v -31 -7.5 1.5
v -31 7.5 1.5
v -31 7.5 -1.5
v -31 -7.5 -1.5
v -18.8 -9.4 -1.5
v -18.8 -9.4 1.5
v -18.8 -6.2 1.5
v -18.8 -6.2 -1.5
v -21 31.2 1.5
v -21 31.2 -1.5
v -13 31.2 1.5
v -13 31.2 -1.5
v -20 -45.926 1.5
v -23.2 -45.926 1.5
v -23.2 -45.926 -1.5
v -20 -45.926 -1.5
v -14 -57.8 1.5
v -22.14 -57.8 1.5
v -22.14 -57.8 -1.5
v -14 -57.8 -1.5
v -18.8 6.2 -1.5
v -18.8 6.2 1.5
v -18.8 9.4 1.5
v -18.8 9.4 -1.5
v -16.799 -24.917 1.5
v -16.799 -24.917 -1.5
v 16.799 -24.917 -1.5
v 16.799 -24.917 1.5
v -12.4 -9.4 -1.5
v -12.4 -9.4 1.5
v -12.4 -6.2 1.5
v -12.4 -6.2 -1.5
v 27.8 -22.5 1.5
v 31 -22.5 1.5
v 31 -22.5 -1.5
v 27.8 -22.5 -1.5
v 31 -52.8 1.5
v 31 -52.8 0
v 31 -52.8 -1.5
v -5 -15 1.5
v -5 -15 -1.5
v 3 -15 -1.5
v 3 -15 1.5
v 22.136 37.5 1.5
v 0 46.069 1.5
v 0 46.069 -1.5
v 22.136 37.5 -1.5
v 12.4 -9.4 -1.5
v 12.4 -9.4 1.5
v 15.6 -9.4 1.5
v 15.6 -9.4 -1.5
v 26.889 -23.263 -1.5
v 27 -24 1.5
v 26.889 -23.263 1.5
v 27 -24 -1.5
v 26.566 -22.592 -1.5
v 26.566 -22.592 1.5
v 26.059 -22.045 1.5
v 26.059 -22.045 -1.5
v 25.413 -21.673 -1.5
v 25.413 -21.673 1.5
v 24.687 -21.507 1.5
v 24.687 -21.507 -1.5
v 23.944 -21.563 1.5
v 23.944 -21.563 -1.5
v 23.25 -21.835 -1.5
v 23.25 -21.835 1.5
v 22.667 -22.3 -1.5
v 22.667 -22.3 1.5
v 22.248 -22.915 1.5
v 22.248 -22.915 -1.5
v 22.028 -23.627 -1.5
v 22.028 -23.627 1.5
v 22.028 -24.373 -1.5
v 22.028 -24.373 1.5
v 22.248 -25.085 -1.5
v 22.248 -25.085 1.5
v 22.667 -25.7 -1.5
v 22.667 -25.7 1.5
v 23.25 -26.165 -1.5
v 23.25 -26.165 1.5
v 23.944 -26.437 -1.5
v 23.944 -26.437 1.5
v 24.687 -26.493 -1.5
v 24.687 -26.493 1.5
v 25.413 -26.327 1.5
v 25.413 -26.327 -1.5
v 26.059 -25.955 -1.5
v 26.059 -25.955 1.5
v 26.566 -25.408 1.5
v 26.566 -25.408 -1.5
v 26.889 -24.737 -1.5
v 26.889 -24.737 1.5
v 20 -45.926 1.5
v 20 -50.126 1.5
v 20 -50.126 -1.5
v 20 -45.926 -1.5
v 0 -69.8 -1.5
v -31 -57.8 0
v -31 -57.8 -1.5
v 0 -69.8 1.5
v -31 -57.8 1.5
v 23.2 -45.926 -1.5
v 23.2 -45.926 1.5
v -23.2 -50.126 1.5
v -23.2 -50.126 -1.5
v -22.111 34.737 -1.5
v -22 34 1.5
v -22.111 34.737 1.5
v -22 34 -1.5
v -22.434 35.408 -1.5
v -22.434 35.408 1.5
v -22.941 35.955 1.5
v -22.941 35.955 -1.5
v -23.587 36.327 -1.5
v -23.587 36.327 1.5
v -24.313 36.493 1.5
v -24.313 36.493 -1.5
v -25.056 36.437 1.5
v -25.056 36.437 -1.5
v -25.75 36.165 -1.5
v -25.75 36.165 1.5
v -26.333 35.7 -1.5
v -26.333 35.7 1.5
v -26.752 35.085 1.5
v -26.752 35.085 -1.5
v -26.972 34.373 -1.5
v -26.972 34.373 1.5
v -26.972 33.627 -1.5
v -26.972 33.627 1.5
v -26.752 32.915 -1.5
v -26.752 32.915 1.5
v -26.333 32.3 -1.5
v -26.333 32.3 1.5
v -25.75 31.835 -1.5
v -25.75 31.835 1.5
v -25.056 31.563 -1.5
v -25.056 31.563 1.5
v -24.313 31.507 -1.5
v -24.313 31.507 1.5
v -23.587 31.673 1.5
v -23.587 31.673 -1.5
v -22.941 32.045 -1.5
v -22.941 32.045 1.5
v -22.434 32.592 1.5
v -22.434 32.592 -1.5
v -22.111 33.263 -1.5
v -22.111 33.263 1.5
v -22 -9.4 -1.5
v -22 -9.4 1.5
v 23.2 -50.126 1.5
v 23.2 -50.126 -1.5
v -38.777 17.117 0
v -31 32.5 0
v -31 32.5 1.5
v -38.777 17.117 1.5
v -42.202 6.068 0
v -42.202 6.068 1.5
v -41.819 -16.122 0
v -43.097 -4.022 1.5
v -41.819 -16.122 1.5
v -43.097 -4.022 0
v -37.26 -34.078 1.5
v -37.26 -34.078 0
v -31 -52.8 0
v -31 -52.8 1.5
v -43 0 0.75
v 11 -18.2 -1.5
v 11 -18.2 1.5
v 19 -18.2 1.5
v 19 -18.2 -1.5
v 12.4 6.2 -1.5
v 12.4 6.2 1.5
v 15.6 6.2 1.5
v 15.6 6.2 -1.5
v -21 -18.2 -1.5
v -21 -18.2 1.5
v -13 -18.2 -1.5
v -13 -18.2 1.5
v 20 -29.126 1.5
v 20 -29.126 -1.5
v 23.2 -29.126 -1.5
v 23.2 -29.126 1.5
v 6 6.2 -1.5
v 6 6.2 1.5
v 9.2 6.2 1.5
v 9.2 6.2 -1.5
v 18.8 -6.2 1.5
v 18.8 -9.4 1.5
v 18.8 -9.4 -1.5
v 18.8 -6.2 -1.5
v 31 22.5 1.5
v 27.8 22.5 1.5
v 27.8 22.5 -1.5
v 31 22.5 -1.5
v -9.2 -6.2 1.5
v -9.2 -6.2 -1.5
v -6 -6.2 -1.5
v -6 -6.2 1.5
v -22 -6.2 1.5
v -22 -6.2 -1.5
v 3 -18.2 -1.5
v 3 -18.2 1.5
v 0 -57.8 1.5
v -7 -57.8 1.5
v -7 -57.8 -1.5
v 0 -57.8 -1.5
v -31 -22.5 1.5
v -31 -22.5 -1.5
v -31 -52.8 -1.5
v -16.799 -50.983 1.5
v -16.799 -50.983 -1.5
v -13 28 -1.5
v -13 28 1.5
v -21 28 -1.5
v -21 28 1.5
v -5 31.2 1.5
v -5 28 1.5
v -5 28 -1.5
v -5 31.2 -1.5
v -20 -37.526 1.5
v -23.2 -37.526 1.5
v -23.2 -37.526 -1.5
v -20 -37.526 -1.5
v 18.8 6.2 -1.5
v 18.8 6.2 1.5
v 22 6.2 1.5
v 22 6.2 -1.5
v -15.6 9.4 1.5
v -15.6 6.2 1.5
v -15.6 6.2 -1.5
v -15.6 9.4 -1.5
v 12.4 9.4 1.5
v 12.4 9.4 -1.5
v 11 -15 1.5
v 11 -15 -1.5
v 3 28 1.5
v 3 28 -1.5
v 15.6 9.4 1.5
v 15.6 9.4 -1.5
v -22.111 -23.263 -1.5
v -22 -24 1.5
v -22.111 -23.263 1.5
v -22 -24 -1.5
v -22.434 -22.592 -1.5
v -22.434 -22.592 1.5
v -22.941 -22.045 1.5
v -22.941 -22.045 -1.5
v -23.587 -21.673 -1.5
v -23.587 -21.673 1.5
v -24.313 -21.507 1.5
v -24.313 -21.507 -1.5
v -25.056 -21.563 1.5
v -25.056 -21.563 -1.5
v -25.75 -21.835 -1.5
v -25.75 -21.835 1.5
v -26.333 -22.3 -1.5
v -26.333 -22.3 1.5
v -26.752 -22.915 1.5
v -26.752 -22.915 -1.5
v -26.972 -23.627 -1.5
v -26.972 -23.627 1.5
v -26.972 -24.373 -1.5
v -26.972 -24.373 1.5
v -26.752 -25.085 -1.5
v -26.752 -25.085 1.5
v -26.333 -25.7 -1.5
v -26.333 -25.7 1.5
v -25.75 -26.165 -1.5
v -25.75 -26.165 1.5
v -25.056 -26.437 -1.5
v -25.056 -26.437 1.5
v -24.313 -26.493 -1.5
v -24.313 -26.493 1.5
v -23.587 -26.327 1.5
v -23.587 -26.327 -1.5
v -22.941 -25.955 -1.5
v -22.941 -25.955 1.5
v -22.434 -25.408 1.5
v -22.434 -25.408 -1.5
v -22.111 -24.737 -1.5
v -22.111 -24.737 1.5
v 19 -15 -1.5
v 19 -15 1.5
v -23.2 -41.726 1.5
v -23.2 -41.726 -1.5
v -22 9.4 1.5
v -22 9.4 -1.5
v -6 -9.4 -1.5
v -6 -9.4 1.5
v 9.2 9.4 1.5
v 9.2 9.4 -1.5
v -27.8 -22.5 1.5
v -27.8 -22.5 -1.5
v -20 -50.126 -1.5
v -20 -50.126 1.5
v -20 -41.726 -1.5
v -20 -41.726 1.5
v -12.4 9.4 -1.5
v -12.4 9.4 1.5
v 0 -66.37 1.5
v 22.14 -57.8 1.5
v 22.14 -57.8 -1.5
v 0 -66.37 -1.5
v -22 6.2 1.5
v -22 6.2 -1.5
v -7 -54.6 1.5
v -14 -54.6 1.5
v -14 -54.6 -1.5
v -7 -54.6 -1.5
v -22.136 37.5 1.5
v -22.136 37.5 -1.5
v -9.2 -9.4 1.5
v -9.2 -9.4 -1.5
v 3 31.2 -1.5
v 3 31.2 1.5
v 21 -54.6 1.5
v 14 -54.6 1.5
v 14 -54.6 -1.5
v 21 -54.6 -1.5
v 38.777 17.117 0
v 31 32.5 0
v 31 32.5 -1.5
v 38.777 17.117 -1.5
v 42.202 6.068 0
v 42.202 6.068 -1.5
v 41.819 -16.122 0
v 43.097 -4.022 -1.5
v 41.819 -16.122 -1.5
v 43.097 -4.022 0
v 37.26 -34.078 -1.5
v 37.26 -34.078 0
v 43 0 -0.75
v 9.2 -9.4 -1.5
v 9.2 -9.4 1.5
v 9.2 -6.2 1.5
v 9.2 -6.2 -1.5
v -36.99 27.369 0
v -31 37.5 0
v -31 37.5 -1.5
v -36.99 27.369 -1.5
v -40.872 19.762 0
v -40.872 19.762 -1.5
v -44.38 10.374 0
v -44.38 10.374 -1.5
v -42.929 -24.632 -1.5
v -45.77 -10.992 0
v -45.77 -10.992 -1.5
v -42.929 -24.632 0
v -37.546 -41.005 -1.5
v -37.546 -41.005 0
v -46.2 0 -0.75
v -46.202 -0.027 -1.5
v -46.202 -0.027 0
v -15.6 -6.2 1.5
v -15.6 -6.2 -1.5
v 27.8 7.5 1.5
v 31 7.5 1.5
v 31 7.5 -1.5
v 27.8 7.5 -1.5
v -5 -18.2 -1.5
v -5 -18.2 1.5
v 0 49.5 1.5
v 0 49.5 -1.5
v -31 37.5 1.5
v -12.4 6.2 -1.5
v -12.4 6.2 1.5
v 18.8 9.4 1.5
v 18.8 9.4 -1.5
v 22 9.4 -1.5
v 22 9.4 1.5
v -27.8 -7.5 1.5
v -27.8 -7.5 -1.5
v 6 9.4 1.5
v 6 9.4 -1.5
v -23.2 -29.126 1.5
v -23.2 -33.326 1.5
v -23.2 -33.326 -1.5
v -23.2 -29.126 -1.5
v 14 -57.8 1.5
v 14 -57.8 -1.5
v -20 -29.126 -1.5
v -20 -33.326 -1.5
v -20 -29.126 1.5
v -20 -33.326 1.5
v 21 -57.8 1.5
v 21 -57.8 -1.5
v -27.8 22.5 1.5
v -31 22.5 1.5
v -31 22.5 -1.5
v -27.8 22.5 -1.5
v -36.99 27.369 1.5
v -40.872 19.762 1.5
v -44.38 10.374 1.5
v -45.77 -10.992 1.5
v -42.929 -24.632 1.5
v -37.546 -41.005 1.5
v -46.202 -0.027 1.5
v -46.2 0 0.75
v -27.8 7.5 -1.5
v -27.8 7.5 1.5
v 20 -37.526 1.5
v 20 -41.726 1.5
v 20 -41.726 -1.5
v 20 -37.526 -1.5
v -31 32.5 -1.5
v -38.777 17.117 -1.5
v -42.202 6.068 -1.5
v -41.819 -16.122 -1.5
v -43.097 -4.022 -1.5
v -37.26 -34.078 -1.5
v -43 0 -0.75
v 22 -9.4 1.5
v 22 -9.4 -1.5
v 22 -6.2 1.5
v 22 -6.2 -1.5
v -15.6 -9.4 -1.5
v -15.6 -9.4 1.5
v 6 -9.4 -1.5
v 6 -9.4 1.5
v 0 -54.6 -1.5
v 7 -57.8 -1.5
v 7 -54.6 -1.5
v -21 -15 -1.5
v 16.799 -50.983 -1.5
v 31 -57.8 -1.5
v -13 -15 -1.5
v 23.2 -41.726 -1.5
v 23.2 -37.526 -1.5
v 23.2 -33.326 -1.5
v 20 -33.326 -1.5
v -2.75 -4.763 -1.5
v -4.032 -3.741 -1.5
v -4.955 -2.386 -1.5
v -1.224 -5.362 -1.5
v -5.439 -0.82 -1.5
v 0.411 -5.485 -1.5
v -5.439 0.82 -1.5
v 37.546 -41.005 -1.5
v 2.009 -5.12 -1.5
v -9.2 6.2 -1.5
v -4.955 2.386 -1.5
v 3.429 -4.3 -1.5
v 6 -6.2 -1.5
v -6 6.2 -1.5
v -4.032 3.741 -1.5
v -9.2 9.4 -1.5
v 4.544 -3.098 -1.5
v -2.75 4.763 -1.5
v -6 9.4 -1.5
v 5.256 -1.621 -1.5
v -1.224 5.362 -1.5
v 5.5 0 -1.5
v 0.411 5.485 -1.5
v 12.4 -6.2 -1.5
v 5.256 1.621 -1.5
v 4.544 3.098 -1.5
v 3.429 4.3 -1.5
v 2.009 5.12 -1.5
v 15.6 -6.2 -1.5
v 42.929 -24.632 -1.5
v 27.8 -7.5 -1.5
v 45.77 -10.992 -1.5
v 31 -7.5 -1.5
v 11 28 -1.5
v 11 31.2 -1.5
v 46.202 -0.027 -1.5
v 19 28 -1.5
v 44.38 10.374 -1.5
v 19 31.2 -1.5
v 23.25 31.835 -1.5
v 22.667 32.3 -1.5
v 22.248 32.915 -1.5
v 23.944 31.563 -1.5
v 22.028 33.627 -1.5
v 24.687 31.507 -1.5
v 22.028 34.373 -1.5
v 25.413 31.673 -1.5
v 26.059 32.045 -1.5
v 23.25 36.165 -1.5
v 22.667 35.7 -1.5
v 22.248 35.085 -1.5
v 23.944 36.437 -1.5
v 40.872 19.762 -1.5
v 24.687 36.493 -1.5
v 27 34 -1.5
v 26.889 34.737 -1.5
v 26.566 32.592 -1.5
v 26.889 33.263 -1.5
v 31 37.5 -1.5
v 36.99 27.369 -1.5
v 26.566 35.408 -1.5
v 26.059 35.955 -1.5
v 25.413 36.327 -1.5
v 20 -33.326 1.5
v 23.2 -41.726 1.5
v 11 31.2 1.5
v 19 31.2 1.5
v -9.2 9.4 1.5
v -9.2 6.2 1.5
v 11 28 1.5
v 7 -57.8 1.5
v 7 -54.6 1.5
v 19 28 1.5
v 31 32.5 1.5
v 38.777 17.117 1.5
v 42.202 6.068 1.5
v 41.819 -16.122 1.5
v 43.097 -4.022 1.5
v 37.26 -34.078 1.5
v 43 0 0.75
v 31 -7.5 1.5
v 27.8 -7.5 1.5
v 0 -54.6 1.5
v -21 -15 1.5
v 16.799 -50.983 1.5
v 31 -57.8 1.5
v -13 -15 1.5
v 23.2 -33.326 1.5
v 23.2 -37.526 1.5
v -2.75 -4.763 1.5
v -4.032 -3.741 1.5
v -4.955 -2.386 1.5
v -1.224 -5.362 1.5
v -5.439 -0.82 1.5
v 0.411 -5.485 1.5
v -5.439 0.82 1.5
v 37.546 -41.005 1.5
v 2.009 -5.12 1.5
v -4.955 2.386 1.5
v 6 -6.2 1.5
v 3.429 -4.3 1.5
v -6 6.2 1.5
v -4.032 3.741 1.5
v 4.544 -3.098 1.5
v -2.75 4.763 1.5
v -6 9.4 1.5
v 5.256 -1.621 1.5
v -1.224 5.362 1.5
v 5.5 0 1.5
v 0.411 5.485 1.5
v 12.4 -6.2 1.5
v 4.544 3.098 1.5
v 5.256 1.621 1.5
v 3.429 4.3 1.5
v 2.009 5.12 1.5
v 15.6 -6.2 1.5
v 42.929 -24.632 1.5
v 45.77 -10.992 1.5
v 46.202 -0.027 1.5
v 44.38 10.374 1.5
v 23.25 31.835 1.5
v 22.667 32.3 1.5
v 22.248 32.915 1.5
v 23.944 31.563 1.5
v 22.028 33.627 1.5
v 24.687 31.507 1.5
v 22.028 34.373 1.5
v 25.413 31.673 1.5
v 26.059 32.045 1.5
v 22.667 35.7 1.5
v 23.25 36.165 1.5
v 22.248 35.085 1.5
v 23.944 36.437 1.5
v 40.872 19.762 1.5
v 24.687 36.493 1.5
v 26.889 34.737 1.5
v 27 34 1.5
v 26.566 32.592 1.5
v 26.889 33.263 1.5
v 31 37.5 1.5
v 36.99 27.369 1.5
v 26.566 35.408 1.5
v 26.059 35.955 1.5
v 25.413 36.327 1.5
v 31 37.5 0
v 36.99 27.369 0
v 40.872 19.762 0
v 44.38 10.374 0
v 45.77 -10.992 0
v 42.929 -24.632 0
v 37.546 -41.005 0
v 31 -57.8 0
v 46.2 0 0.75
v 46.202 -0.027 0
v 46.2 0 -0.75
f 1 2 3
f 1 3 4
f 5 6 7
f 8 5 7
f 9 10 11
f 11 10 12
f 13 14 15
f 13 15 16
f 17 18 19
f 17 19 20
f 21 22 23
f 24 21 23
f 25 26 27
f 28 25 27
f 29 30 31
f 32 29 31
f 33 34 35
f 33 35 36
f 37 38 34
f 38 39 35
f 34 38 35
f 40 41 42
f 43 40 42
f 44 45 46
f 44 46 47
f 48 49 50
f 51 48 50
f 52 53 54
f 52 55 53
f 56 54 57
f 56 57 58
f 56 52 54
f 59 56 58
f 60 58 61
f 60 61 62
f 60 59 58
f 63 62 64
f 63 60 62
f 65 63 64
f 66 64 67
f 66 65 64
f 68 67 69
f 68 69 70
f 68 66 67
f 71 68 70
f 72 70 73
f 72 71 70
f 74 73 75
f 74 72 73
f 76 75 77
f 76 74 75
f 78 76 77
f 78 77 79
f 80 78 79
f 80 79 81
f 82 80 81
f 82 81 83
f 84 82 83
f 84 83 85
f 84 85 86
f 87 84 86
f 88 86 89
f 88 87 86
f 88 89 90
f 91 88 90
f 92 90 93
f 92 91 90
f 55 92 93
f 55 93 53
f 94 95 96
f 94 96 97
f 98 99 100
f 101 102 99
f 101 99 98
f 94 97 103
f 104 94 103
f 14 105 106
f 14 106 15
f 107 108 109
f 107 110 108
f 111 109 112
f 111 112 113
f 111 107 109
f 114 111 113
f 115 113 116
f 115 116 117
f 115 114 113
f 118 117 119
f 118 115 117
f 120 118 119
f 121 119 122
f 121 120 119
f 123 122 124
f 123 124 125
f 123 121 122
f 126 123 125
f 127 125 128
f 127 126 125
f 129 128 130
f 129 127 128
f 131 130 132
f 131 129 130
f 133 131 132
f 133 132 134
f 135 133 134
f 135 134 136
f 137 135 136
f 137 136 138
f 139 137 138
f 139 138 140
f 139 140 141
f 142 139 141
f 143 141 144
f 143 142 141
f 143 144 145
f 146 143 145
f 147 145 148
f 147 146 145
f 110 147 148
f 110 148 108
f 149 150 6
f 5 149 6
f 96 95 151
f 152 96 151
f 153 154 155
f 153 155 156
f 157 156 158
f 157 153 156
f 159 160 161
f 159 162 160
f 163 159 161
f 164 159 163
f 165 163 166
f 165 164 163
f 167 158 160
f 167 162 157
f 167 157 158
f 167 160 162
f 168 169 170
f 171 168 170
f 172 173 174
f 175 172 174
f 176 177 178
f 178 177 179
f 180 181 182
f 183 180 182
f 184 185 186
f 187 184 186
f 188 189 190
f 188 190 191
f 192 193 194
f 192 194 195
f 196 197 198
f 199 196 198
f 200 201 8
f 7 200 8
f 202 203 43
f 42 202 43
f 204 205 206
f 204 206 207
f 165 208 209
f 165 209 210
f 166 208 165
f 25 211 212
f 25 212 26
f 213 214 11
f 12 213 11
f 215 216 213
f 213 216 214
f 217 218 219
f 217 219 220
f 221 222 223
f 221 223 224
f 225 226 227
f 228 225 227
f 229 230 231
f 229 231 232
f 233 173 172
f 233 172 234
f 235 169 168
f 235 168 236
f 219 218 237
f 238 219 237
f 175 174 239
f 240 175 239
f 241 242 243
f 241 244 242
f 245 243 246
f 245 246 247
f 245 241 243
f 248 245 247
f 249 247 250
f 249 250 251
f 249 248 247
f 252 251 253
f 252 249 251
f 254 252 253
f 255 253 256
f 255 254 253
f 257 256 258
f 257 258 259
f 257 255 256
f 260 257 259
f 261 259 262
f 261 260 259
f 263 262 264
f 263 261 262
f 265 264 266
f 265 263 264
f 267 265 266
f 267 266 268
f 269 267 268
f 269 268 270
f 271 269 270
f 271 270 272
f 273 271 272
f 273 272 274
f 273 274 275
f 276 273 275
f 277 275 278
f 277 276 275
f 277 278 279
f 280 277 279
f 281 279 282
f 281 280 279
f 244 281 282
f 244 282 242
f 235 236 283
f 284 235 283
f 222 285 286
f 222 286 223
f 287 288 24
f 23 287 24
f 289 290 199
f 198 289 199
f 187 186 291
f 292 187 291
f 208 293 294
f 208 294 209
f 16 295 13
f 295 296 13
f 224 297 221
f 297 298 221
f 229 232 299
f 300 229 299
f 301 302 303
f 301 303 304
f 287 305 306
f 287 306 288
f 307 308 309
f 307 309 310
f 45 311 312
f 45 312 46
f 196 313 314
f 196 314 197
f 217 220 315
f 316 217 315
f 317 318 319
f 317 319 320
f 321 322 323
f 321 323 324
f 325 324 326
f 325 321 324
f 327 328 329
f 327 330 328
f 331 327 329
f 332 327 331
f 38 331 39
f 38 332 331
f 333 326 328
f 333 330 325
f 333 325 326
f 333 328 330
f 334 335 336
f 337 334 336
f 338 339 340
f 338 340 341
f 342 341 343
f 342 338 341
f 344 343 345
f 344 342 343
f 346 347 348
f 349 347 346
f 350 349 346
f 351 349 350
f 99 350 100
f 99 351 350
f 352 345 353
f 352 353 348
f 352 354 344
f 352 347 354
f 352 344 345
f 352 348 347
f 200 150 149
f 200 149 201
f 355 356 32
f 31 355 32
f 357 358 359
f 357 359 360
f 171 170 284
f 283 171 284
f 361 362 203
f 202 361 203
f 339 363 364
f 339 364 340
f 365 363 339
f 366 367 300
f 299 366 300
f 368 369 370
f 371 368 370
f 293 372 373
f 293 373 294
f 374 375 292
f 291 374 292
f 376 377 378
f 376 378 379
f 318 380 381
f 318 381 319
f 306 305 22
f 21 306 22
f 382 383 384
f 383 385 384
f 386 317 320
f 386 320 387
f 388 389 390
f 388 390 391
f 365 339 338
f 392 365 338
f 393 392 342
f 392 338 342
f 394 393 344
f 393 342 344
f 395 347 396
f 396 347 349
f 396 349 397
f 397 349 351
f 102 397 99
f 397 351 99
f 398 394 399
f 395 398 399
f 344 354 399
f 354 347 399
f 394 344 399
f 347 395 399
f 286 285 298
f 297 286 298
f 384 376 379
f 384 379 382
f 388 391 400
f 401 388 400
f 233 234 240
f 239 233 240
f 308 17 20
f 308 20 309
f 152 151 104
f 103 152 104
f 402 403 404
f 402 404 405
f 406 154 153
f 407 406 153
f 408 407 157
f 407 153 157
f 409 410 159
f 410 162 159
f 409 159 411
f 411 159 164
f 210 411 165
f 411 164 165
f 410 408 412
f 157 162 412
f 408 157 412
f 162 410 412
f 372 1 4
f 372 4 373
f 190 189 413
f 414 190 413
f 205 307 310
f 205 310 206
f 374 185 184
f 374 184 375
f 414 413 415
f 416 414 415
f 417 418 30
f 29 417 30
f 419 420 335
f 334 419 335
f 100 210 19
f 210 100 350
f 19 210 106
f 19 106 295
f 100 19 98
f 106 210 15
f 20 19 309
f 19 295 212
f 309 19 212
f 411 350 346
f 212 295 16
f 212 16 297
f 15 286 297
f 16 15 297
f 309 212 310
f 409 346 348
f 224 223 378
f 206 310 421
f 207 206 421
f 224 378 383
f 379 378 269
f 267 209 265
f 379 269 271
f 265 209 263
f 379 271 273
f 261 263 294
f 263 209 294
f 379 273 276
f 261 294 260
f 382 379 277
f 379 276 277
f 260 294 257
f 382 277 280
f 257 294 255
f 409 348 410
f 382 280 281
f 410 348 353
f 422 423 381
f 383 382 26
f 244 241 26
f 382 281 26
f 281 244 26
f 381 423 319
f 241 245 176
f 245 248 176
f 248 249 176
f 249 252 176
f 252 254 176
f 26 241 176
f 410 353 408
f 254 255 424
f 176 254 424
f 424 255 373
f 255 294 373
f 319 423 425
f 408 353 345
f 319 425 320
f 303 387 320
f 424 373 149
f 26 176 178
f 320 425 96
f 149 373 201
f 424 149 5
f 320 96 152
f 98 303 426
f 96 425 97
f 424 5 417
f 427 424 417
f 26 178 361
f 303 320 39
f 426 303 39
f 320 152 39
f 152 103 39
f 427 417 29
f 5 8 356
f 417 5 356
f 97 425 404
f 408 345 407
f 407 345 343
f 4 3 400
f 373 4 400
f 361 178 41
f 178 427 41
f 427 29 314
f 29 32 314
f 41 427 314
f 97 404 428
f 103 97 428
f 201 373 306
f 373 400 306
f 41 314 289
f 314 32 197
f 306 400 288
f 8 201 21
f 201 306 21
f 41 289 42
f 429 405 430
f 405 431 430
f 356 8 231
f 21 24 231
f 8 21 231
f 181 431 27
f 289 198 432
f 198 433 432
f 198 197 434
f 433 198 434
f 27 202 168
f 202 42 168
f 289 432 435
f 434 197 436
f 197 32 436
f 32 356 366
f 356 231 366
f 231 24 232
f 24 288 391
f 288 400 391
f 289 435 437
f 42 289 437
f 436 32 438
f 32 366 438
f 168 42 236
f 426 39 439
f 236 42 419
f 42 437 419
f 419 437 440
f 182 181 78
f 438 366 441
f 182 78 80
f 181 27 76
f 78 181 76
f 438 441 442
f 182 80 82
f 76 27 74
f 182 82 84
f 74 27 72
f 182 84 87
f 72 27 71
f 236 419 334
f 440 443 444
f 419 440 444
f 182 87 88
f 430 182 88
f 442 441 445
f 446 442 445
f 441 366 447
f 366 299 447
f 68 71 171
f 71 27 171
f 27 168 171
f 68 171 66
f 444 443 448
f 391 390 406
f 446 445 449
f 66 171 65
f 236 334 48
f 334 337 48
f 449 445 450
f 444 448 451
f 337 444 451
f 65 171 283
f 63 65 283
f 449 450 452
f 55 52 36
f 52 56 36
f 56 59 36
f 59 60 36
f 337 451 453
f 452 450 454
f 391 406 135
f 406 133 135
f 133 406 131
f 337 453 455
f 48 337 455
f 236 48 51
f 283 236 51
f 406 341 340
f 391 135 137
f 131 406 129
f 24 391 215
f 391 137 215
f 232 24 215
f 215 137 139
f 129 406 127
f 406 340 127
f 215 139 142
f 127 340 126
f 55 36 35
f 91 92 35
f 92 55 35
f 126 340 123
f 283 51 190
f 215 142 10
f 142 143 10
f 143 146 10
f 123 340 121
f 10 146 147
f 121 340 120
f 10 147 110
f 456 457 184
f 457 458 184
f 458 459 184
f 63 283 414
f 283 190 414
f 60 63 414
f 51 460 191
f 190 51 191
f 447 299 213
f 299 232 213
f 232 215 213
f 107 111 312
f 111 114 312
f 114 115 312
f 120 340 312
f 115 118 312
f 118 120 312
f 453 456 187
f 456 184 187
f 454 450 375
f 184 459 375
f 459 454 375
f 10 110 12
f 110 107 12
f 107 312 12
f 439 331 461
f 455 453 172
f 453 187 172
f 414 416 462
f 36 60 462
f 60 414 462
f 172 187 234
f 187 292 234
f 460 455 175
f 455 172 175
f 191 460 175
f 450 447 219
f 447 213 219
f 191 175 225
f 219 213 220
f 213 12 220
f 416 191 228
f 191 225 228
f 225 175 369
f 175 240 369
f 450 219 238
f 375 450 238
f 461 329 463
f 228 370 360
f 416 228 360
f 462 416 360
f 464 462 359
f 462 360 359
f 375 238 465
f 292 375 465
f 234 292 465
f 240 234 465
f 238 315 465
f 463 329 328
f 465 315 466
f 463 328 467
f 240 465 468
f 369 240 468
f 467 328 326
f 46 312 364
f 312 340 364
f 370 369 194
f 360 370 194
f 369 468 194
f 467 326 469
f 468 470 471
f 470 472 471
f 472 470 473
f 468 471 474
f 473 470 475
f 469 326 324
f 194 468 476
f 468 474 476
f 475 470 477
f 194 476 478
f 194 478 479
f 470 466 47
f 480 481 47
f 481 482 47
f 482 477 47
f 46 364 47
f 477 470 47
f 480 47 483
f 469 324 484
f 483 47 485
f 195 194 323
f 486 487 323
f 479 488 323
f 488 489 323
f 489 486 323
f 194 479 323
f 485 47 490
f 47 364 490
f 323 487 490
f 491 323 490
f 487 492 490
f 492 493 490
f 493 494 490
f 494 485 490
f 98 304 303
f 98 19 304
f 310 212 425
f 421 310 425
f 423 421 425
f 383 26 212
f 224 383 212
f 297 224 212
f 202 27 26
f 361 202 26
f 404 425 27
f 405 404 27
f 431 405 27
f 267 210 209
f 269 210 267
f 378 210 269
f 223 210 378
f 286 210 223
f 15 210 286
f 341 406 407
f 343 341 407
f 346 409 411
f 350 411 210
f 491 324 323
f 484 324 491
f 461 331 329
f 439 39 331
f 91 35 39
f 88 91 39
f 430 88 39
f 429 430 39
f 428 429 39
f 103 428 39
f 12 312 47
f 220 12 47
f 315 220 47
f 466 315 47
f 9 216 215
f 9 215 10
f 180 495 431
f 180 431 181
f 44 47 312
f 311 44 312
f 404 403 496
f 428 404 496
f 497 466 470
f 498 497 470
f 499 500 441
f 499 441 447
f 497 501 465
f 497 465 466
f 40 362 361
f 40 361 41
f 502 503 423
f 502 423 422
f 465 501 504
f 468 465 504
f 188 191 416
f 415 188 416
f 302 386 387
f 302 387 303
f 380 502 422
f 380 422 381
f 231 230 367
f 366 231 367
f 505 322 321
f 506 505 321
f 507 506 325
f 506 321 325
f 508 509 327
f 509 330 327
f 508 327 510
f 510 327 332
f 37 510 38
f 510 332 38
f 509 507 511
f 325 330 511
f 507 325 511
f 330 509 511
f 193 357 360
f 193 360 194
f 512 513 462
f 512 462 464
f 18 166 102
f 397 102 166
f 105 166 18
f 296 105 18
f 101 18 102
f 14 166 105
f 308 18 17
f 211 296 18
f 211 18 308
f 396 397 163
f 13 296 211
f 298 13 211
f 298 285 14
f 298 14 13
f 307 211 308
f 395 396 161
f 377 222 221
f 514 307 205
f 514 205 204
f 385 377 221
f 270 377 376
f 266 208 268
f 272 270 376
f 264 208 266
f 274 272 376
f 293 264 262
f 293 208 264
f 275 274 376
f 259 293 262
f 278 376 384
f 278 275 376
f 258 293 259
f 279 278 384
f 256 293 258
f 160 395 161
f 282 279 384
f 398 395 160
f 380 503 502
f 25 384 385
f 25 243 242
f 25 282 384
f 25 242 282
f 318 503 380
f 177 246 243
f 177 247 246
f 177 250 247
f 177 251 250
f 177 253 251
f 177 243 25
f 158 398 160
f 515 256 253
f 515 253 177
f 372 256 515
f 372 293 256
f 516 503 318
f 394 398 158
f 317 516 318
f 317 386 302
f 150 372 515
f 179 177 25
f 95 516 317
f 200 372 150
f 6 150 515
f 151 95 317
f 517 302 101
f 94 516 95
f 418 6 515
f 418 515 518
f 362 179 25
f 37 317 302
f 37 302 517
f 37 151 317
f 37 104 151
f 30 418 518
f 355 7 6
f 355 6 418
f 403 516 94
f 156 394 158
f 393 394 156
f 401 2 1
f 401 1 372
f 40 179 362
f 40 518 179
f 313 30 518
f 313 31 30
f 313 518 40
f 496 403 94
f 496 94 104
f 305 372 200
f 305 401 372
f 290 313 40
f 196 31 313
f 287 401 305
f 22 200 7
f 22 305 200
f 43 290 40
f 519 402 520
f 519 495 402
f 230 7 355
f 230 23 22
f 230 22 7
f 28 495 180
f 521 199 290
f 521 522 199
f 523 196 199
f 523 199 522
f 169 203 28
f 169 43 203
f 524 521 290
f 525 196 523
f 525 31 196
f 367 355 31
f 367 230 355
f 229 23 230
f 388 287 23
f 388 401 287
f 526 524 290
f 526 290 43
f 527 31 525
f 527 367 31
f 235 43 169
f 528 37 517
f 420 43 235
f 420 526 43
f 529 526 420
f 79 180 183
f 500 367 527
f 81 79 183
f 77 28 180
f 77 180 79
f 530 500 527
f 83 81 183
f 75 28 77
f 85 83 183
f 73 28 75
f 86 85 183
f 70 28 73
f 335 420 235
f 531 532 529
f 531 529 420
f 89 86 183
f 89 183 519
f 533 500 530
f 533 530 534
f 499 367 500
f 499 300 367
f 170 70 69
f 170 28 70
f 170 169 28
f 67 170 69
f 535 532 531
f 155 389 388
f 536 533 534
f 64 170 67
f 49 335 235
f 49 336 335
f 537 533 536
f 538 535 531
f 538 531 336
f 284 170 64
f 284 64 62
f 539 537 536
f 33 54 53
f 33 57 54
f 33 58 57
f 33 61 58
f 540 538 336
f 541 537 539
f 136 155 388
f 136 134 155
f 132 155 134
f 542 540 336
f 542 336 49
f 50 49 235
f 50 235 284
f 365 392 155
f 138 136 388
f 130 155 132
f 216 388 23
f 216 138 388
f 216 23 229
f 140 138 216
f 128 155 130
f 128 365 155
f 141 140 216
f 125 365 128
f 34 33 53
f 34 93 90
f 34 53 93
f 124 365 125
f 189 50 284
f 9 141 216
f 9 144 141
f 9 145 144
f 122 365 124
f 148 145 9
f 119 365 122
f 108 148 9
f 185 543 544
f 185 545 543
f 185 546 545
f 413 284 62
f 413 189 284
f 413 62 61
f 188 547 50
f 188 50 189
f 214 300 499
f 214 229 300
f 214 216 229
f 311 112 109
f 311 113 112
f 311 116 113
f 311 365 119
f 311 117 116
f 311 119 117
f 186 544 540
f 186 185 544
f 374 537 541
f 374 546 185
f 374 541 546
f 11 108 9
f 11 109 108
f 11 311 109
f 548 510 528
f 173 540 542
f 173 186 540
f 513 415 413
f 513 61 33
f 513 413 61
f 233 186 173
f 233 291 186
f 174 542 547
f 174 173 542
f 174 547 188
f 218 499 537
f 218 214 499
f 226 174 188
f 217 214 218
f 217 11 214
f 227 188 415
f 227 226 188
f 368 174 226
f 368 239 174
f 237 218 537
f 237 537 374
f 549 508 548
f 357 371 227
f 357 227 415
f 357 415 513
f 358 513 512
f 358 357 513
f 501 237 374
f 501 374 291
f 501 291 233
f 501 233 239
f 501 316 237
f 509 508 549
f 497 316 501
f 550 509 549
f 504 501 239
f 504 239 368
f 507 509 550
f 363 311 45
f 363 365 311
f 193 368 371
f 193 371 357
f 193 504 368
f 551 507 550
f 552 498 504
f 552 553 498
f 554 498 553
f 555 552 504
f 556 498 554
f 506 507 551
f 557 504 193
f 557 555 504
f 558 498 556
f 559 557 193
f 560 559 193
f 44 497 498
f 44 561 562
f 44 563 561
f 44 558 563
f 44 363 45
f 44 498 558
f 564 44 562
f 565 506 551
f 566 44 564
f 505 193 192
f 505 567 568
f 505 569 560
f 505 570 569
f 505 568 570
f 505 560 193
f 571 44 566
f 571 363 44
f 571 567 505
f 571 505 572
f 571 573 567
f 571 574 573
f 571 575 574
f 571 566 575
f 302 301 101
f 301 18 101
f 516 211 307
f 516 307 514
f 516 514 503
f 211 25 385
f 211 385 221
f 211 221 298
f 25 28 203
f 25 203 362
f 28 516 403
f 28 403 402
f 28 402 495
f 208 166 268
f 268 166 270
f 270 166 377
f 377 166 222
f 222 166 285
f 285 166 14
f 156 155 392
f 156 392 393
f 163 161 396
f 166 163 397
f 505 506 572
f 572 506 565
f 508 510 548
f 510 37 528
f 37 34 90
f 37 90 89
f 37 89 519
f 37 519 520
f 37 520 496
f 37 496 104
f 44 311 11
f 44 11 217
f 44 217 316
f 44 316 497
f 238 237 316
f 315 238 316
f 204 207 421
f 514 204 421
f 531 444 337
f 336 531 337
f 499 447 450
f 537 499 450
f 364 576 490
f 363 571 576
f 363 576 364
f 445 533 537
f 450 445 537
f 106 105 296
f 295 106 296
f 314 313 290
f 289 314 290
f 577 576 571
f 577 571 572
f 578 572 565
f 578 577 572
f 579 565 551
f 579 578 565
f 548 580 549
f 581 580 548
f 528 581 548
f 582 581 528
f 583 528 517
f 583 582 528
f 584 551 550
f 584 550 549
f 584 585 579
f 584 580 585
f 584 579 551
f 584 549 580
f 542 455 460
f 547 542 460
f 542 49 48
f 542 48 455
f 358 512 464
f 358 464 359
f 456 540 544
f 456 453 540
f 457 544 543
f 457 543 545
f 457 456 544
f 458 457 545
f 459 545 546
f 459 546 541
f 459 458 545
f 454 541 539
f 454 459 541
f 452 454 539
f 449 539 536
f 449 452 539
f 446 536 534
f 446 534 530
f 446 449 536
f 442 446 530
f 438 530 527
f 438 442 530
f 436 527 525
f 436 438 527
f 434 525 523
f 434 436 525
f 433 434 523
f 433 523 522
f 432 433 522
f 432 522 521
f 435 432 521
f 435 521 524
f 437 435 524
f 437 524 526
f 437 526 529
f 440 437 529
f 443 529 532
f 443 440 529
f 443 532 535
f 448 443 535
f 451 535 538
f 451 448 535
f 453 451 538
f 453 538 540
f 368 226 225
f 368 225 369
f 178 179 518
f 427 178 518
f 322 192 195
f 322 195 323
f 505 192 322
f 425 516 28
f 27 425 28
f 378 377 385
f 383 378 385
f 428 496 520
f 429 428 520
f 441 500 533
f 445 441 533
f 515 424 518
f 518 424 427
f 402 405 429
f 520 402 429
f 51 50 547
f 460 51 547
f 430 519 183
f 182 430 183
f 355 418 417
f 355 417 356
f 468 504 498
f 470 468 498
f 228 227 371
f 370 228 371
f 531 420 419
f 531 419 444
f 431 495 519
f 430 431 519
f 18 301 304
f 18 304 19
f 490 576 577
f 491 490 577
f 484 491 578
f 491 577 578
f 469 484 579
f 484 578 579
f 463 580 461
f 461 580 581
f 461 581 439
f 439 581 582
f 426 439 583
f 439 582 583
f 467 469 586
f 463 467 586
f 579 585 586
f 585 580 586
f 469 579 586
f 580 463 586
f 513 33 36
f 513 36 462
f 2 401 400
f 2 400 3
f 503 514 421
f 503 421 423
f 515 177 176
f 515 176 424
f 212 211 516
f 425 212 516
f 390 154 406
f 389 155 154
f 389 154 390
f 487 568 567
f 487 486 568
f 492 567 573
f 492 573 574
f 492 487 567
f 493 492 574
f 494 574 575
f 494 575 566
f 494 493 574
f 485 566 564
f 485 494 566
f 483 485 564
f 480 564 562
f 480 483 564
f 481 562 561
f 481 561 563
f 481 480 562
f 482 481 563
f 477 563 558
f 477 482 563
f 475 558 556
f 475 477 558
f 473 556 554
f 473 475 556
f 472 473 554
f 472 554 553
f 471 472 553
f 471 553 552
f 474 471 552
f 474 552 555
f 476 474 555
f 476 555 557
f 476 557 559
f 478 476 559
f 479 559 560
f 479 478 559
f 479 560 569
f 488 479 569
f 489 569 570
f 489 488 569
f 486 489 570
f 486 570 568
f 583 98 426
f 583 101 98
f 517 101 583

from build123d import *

# Parameters (mm, degrees)
F0_W     = 3.2
F0_H     = 4.2
F0_R     = 2.5
F0_W_2   = 8
F0_H_2   = 3.2
F0_W_3   = 33.5989631712
F0_H_3   = 26.0656554639
F0_R_2   = 5.5
F1_DEPTH = 1.5


with BuildPart() as f1:
    # F0 (on Top) → F1 (new body, symmetric)
    with BuildSketch(Plane.XY):
        with BuildLine():
            Line((0, -69.8), (31, -57.8))
            add(Edge.make_bspline(
                [(31, 37.5), (38.1511552694, 25.7567925156), (53.9932959403, -0.2582411241), (39.1454927008, -37.415537584), (31, -57.8)],
                knots=[0, 0, 0, 0, 0.4514008187, 1, 1, 1, 1], degree=3))
            Line((31, 37.5), (0, 49.5))
            Line((0, 49.5), (-31, 37.5))
            add(Edge.make_bspline(
                [(-31, 37.5), (-38.1511552694, 25.7567925156), (-53.9932959403, -0.2582411241), (-39.1454927008, -37.415537584), (-31, -57.8)],
                knots=[0, 0, 0, 0, 0.4514008187, 1, 1, 1, 1], degree=3))
            Line((-31, -57.8), (0, -69.8))
        make_face()
        with Locations((-21.6, -48.02561)):
            Rectangle(F0_W, F0_H, mode=Mode.SUBTRACT)
        with Locations((-21.6, -39.62561)):
            Rectangle(F0_W, F0_H, mode=Mode.SUBTRACT)
        with Locations((-21.6, -31.22561)):
            Rectangle(F0_W, F0_H, mode=Mode.SUBTRACT)
        with Locations((-24.5, -24)):
            Circle(F0_R, mode=Mode.SUBTRACT)
        with Locations((-17, -16.6)):
            Rectangle(F0_W_2, F0_H_2, mode=Mode.SUBTRACT)
        with Locations((-1, -16.6)):
            Rectangle(F0_W_2, F0_H_2, mode=Mode.SUBTRACT)
        Polygon((0, -66.37), (-22.14, -57.8), (-14, -57.8), (-14, -54.6), (-7, -54.6), (-7, -57.8), (0, -57.8), (0, -54.6), (7, -54.6), (7, -57.8), (14, -57.8), (14, -54.6), (21, -54.6), (21, -57.8), (22.14, -57.8), align=None, mode=Mode.SUBTRACT)
        with Locations((21.6, -48.02561)):
            Rectangle(F0_W, F0_H, mode=Mode.SUBTRACT)
        with Locations((0, -37.95)):
            Rectangle(F0_W_3, F0_H_3, mode=Mode.SUBTRACT)
        with Locations((21.6, -39.62561)):
            Rectangle(F0_W, F0_H, mode=Mode.SUBTRACT)
        with Locations((21.6, -31.22561)):
            Rectangle(F0_W, F0_H, mode=Mode.SUBTRACT)
        with Locations((24.5, -24)):
            Circle(F0_R, mode=Mode.SUBTRACT)
        with Locations((15, -16.6)):
            Rectangle(F0_W_2, F0_H_2, mode=Mode.SUBTRACT)
        with BuildLine():
            Line((-31, -22.5), (-31, -32.5))
            Line((-31, -32.5), (-31, -52.8))
            add(Edge.make_bspline(
                [(-31, 32.5), (-36.5997895584, 22.3876839263), (-49.2002368333, -0.3666899989), (-37.5003288582, -34.0731141218), (-31, -52.8)],
                knots=[0, 0, 0, 0, 0.444411967, 1, 1, 1, 1], degree=3))
            Line((-31, 32.5), (-31, 22.5))
            Line((-31, 22.5), (-27.8, 22.5))
            Line((-27.8, 22.5), (-27.8, 7.5))
            Line((-27.8, 7.5), (-31, 7.5))
            Line((-31, 7.5), (-31, -7.5))
            Line((-31, -7.5), (-27.8, -7.5))
            Line((-27.8, -7.5), (-27.8, -22.5))
            Line((-27.8, -22.5), (-31, -22.5))
        make_face(mode=Mode.SUBTRACT)
        with Locations((-20.4, -7.8)):
            Rectangle(F0_W, F0_H_2, mode=Mode.SUBTRACT)
        with Locations((-14, -7.8)):
            Rectangle(F0_W, F0_H_2, mode=Mode.SUBTRACT)
        with Locations((-7.6, -7.8)):
            Rectangle(F0_W, F0_H_2, mode=Mode.SUBTRACT)
        with Locations((-20.4, 7.8)):
            Rectangle(F0_W, F0_H_2, mode=Mode.SUBTRACT)
        with Locations((-14, 7.8)):
            Rectangle(F0_W, F0_H_2, mode=Mode.SUBTRACT)
        with Locations((-7.6, 7.8)):
            Rectangle(F0_W, F0_H_2, mode=Mode.SUBTRACT)
        with Locations((-24.5, 34)):
            Circle(F0_R, mode=Mode.SUBTRACT)
        with Locations((-17, 29.6)):
            Rectangle(F0_W_2, F0_H_2, mode=Mode.SUBTRACT)
        with Locations((-1, 29.6)):
            Rectangle(F0_W_2, F0_H_2, mode=Mode.SUBTRACT)
        Polygon((22.1355892594, 37.5), (0, 37.5), (-22.1355892594, 37.5), (0, 46.0686151972), align=None, mode=Mode.SUBTRACT)
        with Locations((7.6, -7.8)):
            Rectangle(F0_W, F0_H_2, mode=Mode.SUBTRACT)
        Circle(F0_R_2, mode=Mode.SUBTRACT)
        with Locations((14, -7.8)):
            Rectangle(F0_W, F0_H_2, mode=Mode.SUBTRACT)
        with Locations((20.4, -7.8)):
            Rectangle(F0_W, F0_H_2, mode=Mode.SUBTRACT)
        with Locations((7.6, 7.8)):
            Rectangle(F0_W, F0_H_2, mode=Mode.SUBTRACT)
        with Locations((14, 7.8)):
            Rectangle(F0_W, F0_H_2, mode=Mode.SUBTRACT)
        with Locations((20.4, 7.8)):
            Rectangle(F0_W, F0_H_2, mode=Mode.SUBTRACT)
        with BuildLine():
            Line((27.8, 7.5), (27.8, 22.5))
            Line((27.8, 22.5), (31, 22.5))
            Line((31, 22.5), (31, 32.5))
            add(Edge.make_bspline(
                [(31, 32.5), (36.5997895584, 22.3876839263), (49.2002368333, -0.3666899989), (37.5003288582, -34.0731141218), (31, -52.8)],
                knots=[0, 0, 0, 0, 0.444411967, 1, 1, 1, 1], degree=3))
            Line((31, -52.8), (31, -32.5))
            Line((31, -32.5), (31, -22.5))
            Line((31, -22.5), (27.8, -22.5))
            Line((27.8, -22.5), (27.8, -7.5))
            Line((27.8, -7.5), (31, -7.5))
            Line((31, -7.5), (31, 7.5))
            Line((31, 7.5), (27.8, 7.5))
        make_face(mode=Mode.SUBTRACT)
        with Locations((15, 29.6)):
            Rectangle(F0_W_2, F0_H_2, mode=Mode.SUBTRACT)
        with Locations((24.5, 34)):
            Circle(F0_R, mode=Mode.SUBTRACT)
    extrude(amount=F1_DEPTH, both=True)


solid = f1.part
